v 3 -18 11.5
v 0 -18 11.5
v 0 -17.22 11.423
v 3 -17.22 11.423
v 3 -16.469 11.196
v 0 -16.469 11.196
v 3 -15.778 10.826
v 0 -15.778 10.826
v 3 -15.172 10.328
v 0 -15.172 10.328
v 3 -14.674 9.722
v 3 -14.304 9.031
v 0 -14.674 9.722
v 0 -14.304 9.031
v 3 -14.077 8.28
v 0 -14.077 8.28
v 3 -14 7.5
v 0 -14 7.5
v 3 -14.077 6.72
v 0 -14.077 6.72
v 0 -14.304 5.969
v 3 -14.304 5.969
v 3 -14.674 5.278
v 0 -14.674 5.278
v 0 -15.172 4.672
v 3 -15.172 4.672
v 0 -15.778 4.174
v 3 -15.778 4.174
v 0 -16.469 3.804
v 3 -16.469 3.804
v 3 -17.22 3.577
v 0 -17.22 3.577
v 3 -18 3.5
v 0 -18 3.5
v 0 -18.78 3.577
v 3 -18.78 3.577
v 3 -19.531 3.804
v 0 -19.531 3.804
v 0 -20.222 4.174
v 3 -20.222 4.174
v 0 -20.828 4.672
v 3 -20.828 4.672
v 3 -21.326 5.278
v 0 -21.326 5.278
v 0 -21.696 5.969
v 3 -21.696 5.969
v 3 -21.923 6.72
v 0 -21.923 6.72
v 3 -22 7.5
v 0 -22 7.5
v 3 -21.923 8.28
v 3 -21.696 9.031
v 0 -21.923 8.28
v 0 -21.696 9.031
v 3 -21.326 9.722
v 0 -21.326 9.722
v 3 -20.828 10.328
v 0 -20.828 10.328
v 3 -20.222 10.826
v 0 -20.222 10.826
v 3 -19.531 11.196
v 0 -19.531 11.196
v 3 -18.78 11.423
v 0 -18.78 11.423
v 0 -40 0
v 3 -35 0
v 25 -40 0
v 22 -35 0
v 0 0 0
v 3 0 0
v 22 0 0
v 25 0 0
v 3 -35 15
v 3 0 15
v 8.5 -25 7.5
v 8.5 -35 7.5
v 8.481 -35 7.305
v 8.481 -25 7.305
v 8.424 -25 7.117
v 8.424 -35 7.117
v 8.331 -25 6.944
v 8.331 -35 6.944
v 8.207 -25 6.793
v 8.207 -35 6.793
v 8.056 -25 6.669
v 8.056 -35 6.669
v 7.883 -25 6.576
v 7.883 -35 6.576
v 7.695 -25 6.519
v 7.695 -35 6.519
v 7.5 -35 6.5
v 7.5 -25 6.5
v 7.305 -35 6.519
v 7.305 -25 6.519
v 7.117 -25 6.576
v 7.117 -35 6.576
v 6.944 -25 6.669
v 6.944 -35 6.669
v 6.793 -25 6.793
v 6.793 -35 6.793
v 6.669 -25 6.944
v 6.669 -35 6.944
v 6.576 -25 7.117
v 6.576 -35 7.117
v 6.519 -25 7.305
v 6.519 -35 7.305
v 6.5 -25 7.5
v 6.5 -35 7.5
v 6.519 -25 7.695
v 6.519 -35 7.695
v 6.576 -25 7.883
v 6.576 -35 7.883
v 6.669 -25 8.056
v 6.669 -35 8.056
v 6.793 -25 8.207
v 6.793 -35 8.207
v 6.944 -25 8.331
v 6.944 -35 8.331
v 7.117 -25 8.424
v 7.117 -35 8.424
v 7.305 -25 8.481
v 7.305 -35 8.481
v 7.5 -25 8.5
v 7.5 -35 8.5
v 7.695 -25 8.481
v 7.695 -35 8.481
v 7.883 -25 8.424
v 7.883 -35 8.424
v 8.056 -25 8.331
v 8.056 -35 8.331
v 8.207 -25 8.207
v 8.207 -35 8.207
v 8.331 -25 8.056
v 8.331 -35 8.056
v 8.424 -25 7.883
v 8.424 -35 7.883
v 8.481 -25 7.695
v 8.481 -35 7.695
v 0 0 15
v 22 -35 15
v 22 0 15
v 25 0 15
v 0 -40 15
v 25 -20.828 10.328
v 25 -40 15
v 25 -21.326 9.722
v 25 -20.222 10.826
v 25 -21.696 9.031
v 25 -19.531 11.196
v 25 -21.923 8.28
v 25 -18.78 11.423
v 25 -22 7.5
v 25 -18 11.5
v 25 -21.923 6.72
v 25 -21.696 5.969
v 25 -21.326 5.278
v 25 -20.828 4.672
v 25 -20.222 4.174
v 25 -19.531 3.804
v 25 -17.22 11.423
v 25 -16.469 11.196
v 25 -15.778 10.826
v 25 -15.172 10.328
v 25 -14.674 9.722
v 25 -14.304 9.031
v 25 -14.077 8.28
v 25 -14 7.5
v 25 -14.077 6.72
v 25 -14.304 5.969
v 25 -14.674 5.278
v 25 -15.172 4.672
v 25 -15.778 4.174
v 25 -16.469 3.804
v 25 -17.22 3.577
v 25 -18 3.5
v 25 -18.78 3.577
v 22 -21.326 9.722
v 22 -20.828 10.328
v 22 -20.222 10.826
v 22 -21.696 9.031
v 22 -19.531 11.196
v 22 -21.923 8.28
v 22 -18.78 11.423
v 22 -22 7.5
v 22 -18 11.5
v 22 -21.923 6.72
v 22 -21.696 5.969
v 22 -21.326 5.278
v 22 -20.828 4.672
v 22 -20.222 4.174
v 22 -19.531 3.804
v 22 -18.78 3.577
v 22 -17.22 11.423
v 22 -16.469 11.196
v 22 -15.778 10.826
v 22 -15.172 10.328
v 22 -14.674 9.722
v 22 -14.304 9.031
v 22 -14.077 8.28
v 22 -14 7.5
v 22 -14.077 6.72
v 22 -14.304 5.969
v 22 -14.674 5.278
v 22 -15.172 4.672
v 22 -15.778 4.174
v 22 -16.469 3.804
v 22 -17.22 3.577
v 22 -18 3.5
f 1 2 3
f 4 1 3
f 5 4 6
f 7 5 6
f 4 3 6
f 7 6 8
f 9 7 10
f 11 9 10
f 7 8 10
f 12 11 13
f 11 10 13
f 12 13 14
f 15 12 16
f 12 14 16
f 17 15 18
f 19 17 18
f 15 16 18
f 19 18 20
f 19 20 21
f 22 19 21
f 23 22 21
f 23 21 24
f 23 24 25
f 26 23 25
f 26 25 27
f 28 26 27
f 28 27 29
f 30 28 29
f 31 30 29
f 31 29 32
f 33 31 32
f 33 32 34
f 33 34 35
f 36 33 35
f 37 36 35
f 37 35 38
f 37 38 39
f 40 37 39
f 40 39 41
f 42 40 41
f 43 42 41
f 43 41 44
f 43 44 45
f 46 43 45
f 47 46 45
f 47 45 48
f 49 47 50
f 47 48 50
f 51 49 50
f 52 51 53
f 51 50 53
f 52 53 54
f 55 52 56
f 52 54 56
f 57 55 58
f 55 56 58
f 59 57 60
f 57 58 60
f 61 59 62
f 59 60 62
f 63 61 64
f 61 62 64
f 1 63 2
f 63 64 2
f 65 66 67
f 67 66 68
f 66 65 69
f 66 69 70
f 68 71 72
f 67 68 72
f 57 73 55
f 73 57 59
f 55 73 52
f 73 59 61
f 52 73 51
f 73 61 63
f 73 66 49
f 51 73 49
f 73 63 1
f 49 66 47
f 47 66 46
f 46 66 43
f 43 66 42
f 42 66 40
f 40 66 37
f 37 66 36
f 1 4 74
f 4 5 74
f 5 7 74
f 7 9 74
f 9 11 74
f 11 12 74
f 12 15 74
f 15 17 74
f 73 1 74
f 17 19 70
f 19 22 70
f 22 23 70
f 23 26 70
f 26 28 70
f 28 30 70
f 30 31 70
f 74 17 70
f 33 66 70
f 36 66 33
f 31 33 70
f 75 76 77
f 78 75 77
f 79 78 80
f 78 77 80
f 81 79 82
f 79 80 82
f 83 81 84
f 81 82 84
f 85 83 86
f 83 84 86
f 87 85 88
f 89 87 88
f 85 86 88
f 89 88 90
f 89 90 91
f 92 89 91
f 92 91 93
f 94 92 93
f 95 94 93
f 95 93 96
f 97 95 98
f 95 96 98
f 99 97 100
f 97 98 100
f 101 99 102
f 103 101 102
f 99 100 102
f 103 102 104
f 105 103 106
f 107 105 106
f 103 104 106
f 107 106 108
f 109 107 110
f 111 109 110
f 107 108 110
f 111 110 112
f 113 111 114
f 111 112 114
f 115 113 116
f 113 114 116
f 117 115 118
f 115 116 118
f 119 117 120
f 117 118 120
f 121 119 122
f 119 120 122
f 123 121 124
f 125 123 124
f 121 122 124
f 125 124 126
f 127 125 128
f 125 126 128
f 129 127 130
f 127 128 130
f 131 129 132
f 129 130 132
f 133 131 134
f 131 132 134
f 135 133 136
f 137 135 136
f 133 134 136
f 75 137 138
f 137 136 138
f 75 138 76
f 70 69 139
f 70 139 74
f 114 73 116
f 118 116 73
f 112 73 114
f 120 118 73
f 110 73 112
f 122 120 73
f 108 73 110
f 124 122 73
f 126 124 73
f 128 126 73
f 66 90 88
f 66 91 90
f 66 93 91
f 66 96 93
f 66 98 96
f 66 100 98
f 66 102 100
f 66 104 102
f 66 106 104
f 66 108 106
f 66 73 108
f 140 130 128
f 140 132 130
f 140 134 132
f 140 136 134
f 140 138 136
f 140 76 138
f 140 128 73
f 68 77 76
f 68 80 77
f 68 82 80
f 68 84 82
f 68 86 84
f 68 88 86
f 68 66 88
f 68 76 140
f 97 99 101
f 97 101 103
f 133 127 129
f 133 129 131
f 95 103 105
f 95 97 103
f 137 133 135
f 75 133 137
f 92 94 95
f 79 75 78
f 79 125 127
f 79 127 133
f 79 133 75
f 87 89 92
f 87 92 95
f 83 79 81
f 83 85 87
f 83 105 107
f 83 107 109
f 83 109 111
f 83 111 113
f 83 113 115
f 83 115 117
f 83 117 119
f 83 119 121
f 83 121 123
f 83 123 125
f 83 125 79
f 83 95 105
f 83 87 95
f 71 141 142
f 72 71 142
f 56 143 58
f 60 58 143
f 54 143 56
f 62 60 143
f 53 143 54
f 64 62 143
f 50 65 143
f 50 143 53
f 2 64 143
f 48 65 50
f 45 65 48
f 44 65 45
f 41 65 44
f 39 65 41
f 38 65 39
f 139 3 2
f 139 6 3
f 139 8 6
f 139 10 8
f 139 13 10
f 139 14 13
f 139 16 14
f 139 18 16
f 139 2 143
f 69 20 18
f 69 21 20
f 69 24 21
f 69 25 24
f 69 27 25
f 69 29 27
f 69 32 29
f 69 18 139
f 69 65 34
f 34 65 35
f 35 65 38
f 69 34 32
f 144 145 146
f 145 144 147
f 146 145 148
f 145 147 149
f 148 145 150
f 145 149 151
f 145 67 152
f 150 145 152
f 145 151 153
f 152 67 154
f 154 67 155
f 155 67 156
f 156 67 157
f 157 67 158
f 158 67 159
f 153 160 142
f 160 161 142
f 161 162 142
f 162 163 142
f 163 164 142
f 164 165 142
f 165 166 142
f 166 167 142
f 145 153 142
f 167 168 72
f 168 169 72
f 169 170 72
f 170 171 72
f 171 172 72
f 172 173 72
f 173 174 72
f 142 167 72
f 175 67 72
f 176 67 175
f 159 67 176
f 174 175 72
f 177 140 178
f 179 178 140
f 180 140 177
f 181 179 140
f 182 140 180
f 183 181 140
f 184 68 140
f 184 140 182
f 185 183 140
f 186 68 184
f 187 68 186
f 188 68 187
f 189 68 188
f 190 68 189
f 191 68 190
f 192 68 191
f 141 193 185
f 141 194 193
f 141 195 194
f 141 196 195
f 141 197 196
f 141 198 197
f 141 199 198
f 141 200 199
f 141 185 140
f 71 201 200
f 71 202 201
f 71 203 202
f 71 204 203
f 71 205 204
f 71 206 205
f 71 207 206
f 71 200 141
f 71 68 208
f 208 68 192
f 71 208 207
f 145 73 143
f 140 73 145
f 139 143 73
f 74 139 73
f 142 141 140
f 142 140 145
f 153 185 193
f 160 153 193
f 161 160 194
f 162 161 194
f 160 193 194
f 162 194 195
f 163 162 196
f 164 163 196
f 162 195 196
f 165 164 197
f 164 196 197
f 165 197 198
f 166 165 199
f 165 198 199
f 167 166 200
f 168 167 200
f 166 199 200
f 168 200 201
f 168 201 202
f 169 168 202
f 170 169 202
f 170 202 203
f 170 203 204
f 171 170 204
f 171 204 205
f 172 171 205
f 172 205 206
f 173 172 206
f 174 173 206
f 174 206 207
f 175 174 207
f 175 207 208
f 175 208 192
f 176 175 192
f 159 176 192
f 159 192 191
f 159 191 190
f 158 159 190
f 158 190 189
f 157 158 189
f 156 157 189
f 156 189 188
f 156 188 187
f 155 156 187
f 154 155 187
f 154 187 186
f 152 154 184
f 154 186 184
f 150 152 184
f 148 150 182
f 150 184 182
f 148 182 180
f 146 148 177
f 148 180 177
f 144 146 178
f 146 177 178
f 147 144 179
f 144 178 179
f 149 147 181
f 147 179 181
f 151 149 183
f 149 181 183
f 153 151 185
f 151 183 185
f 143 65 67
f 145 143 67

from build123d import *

# Parameters (mm, degrees)
ESQUISSE1_W             = 25
ESQUISSE1_H             = 40
BOSS_EXTRU_2_DEPTH      = 15
ESQUISSE3_W             = 19
ESQUISSE3_H             = 35
ENL_V_MAT_EXTRU_4_DEPTH = 16
ESQUISSE4_R             = 1
BOSS_EXTRU_3_DEPTH      = 10
ESQUISSE5_R             = 4
ENL_V_MAT_EXTRU_5_DEPTH = 26


with BuildPart() as part:
    # Esquisse1 → Boss.-Extru.2 (new body)
    with BuildSketch(Plane.XY):
        with Locations((12.5, -20)):
            Rectangle(ESQUISSE1_W, ESQUISSE1_H)
    extrude(amount=BOSS_EXTRU_2_DEPTH)

    # Esquisse3 → Enlèv. mat.-Extru.4 (cut, through all)
    with BuildSketch(Plane.XY):
        with Locations((12.5, -17.5)):
            Rectangle(ESQUISSE3_W, ESQUISSE3_H)
    extrude(amount=ENL_V_MAT_EXTRU_4_DEPTH, mode=Mode.SUBTRACT)

    # Esquisse4 → Boss.-Extru.3 (add)
    with BuildSketch(Plane(origin=(0, -35, 0), x_dir=(1, 0, 0), z_dir=(0, 1, 0))):
        with Locations((7.5, -7.5)):
            Circle(ESQUISSE4_R)
    extrude(amount=BOSS_EXTRU_3_DEPTH)

    # Esquisse5 → Enlèv. mat.-Extru.5 (cut, through all)
    with BuildSketch(Plane.ZY):
        with Locations((7.5, -18)):
            Circle(ESQUISSE5_R)
    extrude(amount=-ENL_V_MAT_EXTRU_5_DEPTH, mode=Mode.SUBTRACT)


solid = part.part
